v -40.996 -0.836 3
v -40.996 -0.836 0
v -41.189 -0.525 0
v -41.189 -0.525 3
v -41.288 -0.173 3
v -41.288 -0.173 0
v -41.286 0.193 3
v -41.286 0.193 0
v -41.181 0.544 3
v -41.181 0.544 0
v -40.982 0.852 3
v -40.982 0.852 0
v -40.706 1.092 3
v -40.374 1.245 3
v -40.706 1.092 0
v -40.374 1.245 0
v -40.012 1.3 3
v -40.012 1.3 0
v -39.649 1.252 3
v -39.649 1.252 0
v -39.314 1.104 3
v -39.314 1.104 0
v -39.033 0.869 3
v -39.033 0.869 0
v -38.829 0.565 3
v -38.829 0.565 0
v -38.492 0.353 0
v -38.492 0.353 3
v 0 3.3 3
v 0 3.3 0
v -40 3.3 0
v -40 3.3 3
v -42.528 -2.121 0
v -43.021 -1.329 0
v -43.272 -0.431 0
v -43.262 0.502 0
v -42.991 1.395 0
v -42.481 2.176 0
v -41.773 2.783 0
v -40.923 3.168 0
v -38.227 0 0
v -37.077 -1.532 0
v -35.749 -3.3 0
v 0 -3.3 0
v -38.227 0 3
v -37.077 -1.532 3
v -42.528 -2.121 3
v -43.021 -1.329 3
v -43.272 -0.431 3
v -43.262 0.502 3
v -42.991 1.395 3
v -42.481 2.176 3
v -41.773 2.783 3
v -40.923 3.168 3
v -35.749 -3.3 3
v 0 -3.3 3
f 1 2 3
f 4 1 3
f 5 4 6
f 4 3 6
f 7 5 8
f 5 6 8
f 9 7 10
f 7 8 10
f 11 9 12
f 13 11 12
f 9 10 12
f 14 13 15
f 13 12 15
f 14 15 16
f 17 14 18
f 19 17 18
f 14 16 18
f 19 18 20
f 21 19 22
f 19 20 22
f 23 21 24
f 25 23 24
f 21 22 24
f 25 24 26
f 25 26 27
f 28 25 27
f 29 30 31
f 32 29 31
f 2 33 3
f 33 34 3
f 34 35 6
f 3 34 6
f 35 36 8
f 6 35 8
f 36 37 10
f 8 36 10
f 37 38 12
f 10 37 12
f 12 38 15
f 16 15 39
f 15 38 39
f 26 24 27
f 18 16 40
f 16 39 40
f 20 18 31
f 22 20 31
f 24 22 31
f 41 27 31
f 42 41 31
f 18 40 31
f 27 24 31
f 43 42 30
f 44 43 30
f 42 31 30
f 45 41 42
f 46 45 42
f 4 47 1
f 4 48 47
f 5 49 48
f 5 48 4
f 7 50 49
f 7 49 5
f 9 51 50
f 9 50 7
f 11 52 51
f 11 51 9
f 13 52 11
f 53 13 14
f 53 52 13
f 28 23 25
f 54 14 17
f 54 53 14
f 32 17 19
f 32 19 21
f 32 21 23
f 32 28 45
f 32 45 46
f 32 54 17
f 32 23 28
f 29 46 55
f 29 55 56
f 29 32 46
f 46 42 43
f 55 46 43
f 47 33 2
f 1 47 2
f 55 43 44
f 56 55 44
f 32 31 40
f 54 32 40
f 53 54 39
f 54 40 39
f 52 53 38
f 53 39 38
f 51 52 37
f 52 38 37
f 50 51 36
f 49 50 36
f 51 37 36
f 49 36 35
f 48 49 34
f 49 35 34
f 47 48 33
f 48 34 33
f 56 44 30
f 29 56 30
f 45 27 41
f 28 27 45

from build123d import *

# Parameters (mm, degrees)
F1_DEPTH    = 3
F2_T4_DEPTH = 7.0269593276


# Not quite as in the source:
# - a fillet or chamfer that OpenCascade refuses, or shapes differently, is made with other operations: its cross-section is extruded or revolved along the edge and cut away or added


with BuildPart() as f1:
    # F0 (on Top) → F1 (new body)
    with BuildSketch(Plane.XY):
        with BuildLine():
            ThreePointArc((-40.9958577761, -0.8356238926), (-40.4446261863, 1.221600407), (-38.7, 0))
            Line((-38.7, 0), (-38.2265411317, 0))
            Line((-38.2265411317, 0), (-36.7, 0))
            ThreePointArc((-36.7, 0), (-36.7956166893, -0.7886238635), (-37.076925817, -1.5315473615))
            Line((-37.076925817, -1.5315473615), (-35.7494838536, -3.3))
            Line((-35.7494838536, -3.3), (0, -3.3))
            Line((0, -3.3), (0, 0))
            Line((0, 0), (0, 3.3))
            Line((0, 3.3), (-40, 3.3))
            ThreePointArc((-40, 3.3), (-42.9908156972, 1.3946402637), (-42.5279466623, -2.121199112))
            Line((-42.5279466623, -2.121199112), (-40.9958577761, -0.8356238926))
        make_face()
        with BuildLine():
            Line((-36.7, 0), (-38.2265411317, 0))
            Line((-38.2265411317, 0), (-37.076925817, -1.5315473615))
            ThreePointArc((-37.076925817, -1.5315473615), (-36.7956166893, -0.7886238635), (-36.7, 0))
        make_face()
    extrude(amount=F1_DEPTH)

    # F2: chamfer of 1 on 1 edges, made by hand


with BuildPart() as f2_tool2:
    # F2_s3 → F2_t4 (new body)
    with BuildSketch(Plane.XY.offset(-2.0134796638)):
        with BuildLine():
            Line((-38.8293039248, 0.5652173913), (-37.9287684823, 0))
            Line((-37.9287684823, 0), (-38.7, 0))
            ThreePointArc((-38.7, 0), (-38.7360904804, 0.3041919232), (-38.8293039248, 0.5652173913))
        make_face()
    extrude(amount=F2_T4_DEPTH)

    split(bisect_by=Plane(origin=(-24.4503471764, -18.3530031596, 0), x_dir=(0, 0, 1), z_dir=(-0.7997606156, -0.6003190466, 0)), keep=Keep.TOP)


with BuildPart() as f1_1:
    add(f1.part)

    # F2_t1: cut F2_tool2
    add(f2_tool2.part, mode=Mode.SUBTRACT)


solid = f1_1.part
